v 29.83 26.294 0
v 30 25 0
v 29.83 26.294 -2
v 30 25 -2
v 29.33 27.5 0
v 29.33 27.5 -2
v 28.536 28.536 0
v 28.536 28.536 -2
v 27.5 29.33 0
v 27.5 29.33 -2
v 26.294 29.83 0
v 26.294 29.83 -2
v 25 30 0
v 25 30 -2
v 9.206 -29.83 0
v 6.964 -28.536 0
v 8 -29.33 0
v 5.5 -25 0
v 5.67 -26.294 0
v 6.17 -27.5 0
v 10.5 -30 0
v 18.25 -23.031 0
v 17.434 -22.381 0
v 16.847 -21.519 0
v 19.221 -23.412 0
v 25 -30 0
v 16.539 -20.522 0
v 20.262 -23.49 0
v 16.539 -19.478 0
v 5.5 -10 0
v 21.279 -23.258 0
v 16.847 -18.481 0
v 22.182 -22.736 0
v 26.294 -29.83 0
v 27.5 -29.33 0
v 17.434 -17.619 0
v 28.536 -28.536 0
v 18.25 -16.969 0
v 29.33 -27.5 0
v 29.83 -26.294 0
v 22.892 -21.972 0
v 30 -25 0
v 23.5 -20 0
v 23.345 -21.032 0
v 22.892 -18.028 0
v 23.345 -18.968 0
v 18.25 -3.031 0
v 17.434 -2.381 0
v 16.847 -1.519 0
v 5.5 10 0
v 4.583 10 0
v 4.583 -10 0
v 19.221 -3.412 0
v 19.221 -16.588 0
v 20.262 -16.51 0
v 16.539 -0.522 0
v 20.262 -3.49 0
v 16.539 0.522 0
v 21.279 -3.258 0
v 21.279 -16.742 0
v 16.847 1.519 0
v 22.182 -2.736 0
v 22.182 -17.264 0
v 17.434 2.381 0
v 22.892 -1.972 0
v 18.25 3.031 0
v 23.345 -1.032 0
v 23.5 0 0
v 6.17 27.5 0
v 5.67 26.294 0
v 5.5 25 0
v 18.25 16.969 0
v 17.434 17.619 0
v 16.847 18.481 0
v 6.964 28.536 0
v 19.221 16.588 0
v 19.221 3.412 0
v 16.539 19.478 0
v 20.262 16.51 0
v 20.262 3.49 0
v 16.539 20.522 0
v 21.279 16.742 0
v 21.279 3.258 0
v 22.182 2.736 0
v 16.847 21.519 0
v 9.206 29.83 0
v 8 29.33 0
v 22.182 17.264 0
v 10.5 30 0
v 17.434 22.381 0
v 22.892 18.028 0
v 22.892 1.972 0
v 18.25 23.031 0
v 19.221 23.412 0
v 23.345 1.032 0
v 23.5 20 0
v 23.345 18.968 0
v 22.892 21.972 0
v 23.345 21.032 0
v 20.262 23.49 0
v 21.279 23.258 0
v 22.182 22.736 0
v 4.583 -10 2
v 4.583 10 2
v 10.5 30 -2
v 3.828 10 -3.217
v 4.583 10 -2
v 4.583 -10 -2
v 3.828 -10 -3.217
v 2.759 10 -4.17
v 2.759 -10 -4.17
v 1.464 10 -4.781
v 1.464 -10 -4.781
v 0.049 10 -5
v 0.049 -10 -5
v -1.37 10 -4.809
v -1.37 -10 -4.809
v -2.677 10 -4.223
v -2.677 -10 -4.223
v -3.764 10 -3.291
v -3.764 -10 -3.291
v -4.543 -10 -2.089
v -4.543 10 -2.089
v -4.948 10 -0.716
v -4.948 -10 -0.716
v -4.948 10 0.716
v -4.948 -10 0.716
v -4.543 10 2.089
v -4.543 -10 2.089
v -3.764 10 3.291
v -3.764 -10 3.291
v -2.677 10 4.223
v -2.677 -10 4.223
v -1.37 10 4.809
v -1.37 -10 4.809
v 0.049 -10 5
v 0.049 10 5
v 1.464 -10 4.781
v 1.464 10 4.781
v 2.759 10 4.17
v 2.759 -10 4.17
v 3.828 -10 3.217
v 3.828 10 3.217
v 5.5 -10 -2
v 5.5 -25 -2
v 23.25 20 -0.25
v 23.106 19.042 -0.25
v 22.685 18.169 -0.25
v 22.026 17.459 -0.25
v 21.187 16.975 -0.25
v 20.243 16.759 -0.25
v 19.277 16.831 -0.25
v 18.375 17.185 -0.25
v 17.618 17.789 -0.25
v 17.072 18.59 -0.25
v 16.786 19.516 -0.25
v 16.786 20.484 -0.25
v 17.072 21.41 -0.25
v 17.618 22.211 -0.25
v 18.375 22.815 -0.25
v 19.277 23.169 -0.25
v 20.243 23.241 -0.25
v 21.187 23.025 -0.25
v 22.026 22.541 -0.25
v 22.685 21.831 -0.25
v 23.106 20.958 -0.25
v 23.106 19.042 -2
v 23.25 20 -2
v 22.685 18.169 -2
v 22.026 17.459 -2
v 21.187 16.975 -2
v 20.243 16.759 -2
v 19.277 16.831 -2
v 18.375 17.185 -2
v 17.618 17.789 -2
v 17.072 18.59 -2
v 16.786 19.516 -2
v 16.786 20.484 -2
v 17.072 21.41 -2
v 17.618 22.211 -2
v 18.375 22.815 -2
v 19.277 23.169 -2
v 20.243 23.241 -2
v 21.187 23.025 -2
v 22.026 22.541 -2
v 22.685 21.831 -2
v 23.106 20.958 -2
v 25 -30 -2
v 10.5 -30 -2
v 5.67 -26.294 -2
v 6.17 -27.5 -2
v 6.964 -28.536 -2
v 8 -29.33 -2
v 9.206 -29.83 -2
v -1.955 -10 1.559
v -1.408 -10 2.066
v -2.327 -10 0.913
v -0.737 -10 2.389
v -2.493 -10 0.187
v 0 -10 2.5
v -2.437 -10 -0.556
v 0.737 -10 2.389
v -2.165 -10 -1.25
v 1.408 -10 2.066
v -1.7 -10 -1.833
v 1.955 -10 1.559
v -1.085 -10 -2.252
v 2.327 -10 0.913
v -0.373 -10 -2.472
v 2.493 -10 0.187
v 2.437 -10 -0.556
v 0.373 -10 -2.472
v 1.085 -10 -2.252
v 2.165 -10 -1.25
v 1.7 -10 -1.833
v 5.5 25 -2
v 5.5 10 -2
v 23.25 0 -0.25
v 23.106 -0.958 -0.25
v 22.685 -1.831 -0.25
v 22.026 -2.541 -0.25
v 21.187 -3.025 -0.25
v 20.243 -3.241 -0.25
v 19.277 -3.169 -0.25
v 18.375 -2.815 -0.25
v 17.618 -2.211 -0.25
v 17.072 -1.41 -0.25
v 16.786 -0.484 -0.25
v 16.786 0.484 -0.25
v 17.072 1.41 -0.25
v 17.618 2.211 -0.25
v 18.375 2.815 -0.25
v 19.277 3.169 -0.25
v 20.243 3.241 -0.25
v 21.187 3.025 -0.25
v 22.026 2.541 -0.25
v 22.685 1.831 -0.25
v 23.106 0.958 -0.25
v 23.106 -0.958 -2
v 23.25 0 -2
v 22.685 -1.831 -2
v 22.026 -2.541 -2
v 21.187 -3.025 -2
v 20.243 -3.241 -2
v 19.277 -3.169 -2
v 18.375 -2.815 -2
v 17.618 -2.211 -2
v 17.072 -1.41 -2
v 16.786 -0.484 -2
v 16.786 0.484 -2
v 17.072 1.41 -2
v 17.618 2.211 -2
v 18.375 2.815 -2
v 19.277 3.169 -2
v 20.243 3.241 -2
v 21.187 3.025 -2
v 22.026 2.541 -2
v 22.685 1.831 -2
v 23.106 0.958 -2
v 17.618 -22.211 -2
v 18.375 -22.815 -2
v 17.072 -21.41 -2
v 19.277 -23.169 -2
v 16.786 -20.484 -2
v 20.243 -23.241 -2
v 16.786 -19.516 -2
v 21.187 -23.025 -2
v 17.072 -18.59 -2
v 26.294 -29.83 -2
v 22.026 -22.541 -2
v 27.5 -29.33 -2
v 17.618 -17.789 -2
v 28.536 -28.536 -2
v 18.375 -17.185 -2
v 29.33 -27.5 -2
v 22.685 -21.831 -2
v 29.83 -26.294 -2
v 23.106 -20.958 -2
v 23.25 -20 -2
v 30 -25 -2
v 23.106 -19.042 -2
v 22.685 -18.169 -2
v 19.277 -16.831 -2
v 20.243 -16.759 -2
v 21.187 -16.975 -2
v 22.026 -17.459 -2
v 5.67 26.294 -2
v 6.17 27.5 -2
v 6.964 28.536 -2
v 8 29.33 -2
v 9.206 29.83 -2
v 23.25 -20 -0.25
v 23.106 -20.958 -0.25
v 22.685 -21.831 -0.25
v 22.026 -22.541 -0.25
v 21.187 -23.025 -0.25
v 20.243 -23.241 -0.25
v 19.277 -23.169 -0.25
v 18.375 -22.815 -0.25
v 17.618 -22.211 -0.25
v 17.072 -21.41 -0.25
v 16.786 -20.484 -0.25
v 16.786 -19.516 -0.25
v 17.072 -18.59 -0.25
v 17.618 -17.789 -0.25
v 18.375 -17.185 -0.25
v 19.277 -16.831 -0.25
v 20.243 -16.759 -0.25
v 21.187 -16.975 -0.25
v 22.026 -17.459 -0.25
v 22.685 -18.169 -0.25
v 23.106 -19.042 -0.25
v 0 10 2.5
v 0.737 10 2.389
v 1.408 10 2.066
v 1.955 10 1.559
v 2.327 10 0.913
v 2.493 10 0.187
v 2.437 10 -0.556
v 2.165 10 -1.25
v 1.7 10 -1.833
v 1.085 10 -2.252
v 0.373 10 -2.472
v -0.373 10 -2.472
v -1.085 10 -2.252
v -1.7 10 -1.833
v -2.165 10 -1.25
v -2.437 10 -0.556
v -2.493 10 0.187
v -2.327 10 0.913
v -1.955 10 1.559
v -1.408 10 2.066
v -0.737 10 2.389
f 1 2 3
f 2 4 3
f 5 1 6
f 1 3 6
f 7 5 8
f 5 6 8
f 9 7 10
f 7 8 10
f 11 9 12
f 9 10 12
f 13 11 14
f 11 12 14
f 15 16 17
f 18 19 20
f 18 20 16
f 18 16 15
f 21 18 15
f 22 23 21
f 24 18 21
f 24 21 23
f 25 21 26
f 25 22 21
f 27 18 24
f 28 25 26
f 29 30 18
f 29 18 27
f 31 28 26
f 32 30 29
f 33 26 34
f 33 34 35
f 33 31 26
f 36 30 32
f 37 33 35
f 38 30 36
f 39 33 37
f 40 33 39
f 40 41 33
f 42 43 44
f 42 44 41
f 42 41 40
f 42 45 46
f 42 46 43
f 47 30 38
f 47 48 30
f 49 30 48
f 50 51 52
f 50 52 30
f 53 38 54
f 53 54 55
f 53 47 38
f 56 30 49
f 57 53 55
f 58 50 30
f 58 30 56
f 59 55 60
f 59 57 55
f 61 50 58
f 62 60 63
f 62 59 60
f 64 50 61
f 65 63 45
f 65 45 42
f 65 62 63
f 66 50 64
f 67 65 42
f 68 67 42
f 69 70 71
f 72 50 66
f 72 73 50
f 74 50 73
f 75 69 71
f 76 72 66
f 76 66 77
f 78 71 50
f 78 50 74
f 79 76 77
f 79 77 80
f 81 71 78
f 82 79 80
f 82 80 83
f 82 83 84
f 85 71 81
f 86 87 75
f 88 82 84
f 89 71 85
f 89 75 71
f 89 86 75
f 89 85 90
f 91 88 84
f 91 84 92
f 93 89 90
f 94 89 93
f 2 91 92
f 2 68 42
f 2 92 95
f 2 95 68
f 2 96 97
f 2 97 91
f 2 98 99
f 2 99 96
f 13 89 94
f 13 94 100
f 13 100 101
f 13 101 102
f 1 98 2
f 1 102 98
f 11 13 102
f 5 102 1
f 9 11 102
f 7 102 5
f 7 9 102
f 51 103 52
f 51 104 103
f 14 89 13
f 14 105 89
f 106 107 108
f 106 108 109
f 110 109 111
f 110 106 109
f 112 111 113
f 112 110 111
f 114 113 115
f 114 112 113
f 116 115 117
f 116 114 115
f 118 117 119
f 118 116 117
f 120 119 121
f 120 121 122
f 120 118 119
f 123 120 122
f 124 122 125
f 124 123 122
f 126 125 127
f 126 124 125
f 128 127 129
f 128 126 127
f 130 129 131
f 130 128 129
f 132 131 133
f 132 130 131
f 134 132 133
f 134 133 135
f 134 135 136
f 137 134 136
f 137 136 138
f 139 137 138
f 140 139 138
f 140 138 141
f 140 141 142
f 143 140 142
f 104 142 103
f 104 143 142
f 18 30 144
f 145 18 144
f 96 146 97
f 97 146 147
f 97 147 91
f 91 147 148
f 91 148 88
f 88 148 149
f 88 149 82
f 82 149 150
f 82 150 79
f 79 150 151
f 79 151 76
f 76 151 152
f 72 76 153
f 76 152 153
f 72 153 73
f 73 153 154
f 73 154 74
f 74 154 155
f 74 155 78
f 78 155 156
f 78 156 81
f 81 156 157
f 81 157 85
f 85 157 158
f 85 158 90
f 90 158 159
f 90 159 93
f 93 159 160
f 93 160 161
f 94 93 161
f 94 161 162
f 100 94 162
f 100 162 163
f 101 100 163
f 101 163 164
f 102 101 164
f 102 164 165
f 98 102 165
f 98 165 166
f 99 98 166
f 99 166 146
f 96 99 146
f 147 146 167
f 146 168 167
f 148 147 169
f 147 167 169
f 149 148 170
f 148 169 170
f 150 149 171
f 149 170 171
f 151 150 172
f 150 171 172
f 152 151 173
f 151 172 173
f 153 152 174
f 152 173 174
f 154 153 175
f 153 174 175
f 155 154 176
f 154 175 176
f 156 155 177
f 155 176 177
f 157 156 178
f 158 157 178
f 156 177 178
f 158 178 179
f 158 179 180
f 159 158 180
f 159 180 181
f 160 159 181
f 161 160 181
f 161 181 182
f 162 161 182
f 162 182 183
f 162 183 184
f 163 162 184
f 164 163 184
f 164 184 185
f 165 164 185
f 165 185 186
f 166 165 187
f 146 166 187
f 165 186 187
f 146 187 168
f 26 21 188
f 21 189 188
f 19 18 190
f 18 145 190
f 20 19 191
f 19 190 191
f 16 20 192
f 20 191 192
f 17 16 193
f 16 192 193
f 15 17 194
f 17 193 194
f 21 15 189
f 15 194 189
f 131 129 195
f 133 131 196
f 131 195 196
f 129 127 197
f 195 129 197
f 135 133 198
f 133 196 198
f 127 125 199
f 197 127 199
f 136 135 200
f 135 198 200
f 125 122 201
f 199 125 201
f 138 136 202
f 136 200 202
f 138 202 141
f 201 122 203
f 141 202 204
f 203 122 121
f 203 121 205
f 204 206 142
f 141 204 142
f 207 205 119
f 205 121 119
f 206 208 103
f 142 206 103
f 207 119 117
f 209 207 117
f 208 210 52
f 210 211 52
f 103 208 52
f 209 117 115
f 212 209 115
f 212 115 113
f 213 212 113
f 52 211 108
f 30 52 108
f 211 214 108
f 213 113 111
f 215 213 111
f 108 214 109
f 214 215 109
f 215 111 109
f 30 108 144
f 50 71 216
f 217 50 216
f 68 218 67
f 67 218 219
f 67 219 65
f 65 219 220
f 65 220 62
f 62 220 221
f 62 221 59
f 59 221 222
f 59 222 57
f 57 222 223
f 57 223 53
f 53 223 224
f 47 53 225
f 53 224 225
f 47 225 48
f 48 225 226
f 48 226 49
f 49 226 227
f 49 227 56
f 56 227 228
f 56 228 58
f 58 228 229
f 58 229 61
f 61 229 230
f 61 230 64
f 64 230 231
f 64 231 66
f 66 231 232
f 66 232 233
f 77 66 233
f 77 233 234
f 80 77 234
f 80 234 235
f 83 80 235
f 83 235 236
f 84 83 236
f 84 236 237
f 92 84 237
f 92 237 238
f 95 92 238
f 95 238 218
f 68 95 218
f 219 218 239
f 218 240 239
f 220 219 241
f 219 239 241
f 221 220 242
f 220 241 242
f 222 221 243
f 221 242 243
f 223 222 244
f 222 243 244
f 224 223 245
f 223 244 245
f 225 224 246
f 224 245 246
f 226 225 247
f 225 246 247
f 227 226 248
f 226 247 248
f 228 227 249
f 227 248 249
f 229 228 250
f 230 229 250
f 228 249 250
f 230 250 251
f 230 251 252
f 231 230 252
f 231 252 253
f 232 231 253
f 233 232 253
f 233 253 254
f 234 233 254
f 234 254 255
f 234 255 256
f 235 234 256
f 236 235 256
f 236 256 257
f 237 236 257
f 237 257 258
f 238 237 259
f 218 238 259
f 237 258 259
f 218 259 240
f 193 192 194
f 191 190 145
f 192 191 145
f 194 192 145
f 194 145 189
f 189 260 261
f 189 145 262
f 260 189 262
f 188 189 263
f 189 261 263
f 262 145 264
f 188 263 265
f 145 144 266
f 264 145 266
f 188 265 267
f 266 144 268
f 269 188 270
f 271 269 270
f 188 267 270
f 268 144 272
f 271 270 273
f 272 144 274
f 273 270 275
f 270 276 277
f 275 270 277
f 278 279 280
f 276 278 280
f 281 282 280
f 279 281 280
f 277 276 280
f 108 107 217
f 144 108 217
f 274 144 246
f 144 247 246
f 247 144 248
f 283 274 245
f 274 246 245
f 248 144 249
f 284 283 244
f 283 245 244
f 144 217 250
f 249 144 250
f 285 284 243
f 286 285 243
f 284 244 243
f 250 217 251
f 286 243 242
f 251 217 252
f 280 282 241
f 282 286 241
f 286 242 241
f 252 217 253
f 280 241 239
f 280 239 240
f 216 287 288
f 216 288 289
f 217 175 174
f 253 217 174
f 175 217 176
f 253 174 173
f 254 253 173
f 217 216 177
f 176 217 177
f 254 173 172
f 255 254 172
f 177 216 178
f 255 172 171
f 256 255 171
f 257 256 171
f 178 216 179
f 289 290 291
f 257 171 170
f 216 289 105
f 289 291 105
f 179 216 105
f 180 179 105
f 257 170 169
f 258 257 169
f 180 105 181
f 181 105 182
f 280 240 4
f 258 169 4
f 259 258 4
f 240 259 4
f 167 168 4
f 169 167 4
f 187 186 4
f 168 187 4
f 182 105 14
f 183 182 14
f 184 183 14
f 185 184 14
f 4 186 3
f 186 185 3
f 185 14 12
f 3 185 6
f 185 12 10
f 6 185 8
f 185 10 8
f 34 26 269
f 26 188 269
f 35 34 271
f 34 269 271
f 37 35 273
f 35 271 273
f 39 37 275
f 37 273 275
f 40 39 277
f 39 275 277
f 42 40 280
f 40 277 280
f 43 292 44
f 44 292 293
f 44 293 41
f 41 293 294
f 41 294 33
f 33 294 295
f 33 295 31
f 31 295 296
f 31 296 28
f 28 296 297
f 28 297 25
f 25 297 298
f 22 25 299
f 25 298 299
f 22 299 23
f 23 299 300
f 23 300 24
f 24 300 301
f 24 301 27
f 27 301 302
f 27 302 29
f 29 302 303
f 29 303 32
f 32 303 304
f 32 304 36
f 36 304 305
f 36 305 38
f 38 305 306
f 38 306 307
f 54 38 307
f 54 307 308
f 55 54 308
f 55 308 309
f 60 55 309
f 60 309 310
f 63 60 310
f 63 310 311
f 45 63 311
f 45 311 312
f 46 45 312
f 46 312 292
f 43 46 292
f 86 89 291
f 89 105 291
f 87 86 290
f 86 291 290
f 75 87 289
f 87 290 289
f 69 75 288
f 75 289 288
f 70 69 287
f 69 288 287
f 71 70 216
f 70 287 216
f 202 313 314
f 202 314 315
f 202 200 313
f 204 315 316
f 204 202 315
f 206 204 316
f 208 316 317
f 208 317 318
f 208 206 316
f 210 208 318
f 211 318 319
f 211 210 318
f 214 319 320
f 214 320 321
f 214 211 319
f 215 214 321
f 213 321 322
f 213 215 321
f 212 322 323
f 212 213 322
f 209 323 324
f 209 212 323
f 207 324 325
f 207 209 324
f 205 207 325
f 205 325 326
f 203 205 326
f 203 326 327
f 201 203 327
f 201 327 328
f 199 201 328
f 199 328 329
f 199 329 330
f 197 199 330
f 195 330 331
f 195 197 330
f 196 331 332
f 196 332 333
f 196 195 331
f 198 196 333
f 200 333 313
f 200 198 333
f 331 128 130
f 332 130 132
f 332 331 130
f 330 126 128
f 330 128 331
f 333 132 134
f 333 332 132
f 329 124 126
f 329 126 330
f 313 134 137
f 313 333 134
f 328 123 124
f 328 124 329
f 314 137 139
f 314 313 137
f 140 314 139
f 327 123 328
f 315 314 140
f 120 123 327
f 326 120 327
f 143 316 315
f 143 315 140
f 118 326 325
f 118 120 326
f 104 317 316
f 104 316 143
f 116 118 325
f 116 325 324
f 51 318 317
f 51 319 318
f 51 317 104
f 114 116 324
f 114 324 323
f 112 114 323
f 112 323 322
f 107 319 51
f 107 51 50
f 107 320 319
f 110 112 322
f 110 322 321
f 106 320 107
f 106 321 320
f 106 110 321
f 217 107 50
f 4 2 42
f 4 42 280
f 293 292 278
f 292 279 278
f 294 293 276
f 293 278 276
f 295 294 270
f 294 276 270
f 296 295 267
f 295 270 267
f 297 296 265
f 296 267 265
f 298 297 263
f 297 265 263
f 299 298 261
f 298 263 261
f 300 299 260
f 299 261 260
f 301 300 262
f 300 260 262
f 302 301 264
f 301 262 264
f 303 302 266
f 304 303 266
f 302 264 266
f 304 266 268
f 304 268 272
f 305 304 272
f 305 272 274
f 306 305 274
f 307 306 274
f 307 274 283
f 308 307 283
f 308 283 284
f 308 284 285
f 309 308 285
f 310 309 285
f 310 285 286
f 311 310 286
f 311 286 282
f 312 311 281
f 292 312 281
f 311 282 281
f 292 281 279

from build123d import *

# Parameters (mm, degrees)
SKETCH1_W                            = 24.5
SKETCH1_H                            = 2
BOSS_EXTRUDE1_DEPTH                  = 30
SKETCH1_4_R                          = 2.5
BOSS_EXTRUDE2_DEPTH                  = 10
F_6_5_6_5_DIAMETER_HOLE1_D           = 6.5
F_6_5_6_5_DIAMETER_HOLE1_CSINK_D     = 7
F_6_5_6_5_DIAMETER_HOLE1_CSINK_ANGLE = 90
FILLET1_R                            = 5


with BuildPart() as part:
    # Sketch1 → Boss-Extrude1 (new, symmetric)
    with BuildSketch(Plane(origin=(0, 0, 0), x_dir=(1, 0, 0), z_dir=(0, 1, 0))):
        with Locations((17.75, 1)):
            Rectangle(SKETCH1_W, SKETCH1_H)
    extrude(amount=BOSS_EXTRUDE1_DEPTH, both=True)

    # Sketch1<4> → Boss-Extrude2 (add, symmetric)
    with BuildSketch(Plane(origin=(0, 0, 0), x_dir=(1, 0, 0), z_dir=(0, 1, 0))):
        with BuildLine():
            Line((5.5, 0), (5.5, 2))
            Line((5.5, 2), (4.582575695, 2))
            ThreePointArc((4.582575695, 2), (-5, 0), (4.582575695, -2))
            Line((4.582575695, -2), (4.582575695, 0))
            Line((4.582575695, 0), (5.5, 0))
        make_face()
        Circle(SKETCH1_4_R, mode=Mode.SUBTRACT)
    extrude(amount=BOSS_EXTRUDE2_DEPTH, both=True)

    # Ø6.5 (6.5) Diameter Hole1 (through all)
    with Locations(Plane(origin=(0, 0, 0), x_dir=(-1, 0, 0), z_dir=(0, 0, 1))):
        with Locations((-20, 20), (-20, 0), (-20, -20)):
            CounterSinkHole(F_6_5_6_5_DIAMETER_HOLE1_D / 2, F_6_5_6_5_DIAMETER_HOLE1_CSINK_D / 2, counter_sink_angle=F_6_5_6_5_DIAMETER_HOLE1_CSINK_ANGLE)

    # Fillet1
    fillet1_edges = [part.edges().sort_by_distance(p)[0] for p in [
        (30, 30, -1),
        (30, -30, -1),
        (5.5, -30, -1),
        (5.5, 30, -1),
    ]]
    fillet(fillet1_edges, radius=FILLET1_R)


solid = part.part
